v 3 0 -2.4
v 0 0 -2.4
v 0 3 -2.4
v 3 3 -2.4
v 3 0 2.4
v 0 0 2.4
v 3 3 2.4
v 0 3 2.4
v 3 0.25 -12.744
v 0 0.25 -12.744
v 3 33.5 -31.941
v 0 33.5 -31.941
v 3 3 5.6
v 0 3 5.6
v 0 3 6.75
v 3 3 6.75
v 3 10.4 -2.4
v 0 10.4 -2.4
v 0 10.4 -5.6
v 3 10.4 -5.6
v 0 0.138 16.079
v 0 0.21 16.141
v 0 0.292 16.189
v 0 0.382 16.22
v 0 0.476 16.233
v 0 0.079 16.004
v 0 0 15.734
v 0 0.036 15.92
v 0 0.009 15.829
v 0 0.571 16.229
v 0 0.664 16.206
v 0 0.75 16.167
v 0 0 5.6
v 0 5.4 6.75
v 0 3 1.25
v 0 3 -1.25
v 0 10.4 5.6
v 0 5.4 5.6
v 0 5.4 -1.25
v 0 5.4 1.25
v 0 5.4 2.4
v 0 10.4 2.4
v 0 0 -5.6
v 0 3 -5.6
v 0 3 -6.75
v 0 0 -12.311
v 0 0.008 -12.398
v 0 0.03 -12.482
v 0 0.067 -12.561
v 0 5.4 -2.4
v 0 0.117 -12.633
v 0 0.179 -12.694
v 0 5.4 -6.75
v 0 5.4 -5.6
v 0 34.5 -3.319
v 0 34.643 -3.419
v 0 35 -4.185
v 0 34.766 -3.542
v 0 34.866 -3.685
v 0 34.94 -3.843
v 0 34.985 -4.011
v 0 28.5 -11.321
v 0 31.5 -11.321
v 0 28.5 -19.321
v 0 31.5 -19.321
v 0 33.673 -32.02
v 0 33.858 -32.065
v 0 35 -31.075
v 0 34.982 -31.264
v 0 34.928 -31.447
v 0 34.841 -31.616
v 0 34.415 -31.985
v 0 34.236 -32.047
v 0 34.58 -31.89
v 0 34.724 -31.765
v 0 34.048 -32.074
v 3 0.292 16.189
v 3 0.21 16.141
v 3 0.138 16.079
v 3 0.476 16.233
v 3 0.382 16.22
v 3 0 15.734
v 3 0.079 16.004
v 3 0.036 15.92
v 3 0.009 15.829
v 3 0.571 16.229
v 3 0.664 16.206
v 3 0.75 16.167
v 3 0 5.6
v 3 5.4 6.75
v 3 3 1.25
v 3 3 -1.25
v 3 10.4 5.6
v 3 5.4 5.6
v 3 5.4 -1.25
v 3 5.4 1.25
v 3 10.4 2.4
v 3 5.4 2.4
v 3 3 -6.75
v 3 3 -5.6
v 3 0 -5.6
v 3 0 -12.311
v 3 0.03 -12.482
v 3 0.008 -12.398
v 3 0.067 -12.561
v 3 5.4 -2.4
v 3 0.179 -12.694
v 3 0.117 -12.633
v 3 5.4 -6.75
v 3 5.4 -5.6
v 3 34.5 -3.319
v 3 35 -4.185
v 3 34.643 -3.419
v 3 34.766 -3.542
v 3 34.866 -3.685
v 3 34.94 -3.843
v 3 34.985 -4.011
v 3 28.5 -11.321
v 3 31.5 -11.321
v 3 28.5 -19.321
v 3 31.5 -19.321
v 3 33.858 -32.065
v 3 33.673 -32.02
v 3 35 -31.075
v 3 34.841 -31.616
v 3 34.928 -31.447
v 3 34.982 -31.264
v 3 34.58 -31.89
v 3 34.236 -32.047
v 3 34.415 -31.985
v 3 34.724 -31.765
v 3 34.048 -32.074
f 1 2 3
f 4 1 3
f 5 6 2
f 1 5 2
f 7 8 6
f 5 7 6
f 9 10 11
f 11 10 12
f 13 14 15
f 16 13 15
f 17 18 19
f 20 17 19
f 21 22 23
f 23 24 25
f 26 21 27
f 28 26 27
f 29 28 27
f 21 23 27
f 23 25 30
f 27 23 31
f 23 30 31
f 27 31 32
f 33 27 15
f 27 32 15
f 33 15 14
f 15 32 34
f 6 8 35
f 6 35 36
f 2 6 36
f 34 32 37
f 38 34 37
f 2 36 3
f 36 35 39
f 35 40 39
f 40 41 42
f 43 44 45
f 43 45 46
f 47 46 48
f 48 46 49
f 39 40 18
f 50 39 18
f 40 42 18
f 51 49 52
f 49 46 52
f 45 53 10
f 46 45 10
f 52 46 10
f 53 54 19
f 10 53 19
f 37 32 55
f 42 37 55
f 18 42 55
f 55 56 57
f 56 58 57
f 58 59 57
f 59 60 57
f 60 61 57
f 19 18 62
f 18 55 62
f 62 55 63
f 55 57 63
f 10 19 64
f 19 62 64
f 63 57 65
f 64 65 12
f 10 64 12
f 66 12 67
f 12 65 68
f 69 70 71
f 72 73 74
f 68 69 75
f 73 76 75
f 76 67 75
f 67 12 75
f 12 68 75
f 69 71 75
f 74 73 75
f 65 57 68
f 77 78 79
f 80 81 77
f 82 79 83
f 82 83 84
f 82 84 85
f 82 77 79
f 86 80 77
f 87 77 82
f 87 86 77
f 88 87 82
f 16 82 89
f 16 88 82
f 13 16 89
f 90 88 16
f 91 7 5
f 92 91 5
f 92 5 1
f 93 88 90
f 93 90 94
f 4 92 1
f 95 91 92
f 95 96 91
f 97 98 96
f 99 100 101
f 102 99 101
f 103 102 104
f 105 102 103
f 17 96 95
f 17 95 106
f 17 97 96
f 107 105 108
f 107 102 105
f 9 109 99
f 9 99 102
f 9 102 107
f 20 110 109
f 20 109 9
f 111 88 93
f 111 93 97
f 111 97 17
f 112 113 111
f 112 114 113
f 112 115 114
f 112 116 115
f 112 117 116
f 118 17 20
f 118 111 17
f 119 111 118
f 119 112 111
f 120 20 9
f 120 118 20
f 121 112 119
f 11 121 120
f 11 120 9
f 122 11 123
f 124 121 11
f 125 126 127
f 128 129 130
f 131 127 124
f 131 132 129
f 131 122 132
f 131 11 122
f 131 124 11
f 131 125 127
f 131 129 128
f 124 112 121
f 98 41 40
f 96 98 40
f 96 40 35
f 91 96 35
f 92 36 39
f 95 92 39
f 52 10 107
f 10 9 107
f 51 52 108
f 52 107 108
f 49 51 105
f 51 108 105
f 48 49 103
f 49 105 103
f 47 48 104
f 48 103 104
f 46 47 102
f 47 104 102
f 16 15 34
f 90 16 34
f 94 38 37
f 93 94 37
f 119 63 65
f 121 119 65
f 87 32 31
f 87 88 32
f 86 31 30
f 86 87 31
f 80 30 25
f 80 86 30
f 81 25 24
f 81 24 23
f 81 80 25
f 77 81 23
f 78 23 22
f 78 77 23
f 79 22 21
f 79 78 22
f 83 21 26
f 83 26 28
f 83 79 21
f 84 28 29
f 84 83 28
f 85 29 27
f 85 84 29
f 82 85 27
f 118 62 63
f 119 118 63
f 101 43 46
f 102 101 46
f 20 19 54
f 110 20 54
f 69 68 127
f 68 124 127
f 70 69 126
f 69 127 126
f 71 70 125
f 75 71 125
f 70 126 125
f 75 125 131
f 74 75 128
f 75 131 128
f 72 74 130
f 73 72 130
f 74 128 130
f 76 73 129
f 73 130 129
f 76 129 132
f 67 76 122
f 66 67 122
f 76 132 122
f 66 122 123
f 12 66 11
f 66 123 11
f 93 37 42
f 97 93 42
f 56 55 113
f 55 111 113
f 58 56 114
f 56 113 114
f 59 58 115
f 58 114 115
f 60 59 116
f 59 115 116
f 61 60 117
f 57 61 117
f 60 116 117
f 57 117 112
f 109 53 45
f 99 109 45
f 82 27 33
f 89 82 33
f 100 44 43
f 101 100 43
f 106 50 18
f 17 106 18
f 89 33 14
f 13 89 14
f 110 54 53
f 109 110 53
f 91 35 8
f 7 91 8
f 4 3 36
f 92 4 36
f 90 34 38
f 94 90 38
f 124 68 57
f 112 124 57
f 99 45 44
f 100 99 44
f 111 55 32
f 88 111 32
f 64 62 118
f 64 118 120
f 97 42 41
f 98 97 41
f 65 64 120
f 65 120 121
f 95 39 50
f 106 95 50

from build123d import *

# Parameters (mm, degrees)
SKETCH1_W           = 8
SKETCH1_H           = 3
BOSS_EXTRUDE1_DEPTH = 3
FILLET1_R           = 1
FILLET2_R           = 0.5


with BuildPart() as part:
    # Sketch1 → Boss-Extrude1 (new body)
    with BuildSketch(Plane(origin=(0, 0, 0), x_dir=(0, 0, -1), z_dir=(1, 0, 0))):
        Polygon((-5.6, 0), (-5.6, 3), (-6.75, 3), (-6.75, 5.4), (-5.6, 5.4), (-5.6, 10.4), (-2.4, 10.4), (-2.4, 5.4), (-1.25, 5.4), (-1.25, 3), (-2.4, 3), (-2.4, 0), (2.4, 0), (2.4, 3), (1.25, 3), (1.25, 5.4), (2.4, 5.4), (2.4, 10.4), (5.6, 10.4), (5.6, 5.4), (6.75, 5.4), (6.75, 3), (5.6, 3), (5.6, 0), (12.6, 0), (32.807259422, 35), (3.607259422, 35), (-16.6, 0), align=None)
        with Locations((15.320508076, 30)):
            Rectangle(SKETCH1_W, SKETCH1_H, mode=Mode.SUBTRACT)
    extrude(amount=BOSS_EXTRUDE1_DEPTH)

    # Fillet1
    fillet1_edges = [part.edges().sort_by_distance(p)[0] for p in [
        (1.5, 35, -3.607259422),
        (1.5, 35, -32.807259422),
    ]]
    fillet(fillet1_edges, radius=FILLET1_R)

    # Fillet2
    fillet2_edges = [part.edges().sort_by_distance(p)[0] for p in [
        (1.5, 0, 16.6),
        (1.5, 0, -12.6),
    ]]
    fillet(fillet2_edges, radius=FILLET2_R)


solid = part.part
